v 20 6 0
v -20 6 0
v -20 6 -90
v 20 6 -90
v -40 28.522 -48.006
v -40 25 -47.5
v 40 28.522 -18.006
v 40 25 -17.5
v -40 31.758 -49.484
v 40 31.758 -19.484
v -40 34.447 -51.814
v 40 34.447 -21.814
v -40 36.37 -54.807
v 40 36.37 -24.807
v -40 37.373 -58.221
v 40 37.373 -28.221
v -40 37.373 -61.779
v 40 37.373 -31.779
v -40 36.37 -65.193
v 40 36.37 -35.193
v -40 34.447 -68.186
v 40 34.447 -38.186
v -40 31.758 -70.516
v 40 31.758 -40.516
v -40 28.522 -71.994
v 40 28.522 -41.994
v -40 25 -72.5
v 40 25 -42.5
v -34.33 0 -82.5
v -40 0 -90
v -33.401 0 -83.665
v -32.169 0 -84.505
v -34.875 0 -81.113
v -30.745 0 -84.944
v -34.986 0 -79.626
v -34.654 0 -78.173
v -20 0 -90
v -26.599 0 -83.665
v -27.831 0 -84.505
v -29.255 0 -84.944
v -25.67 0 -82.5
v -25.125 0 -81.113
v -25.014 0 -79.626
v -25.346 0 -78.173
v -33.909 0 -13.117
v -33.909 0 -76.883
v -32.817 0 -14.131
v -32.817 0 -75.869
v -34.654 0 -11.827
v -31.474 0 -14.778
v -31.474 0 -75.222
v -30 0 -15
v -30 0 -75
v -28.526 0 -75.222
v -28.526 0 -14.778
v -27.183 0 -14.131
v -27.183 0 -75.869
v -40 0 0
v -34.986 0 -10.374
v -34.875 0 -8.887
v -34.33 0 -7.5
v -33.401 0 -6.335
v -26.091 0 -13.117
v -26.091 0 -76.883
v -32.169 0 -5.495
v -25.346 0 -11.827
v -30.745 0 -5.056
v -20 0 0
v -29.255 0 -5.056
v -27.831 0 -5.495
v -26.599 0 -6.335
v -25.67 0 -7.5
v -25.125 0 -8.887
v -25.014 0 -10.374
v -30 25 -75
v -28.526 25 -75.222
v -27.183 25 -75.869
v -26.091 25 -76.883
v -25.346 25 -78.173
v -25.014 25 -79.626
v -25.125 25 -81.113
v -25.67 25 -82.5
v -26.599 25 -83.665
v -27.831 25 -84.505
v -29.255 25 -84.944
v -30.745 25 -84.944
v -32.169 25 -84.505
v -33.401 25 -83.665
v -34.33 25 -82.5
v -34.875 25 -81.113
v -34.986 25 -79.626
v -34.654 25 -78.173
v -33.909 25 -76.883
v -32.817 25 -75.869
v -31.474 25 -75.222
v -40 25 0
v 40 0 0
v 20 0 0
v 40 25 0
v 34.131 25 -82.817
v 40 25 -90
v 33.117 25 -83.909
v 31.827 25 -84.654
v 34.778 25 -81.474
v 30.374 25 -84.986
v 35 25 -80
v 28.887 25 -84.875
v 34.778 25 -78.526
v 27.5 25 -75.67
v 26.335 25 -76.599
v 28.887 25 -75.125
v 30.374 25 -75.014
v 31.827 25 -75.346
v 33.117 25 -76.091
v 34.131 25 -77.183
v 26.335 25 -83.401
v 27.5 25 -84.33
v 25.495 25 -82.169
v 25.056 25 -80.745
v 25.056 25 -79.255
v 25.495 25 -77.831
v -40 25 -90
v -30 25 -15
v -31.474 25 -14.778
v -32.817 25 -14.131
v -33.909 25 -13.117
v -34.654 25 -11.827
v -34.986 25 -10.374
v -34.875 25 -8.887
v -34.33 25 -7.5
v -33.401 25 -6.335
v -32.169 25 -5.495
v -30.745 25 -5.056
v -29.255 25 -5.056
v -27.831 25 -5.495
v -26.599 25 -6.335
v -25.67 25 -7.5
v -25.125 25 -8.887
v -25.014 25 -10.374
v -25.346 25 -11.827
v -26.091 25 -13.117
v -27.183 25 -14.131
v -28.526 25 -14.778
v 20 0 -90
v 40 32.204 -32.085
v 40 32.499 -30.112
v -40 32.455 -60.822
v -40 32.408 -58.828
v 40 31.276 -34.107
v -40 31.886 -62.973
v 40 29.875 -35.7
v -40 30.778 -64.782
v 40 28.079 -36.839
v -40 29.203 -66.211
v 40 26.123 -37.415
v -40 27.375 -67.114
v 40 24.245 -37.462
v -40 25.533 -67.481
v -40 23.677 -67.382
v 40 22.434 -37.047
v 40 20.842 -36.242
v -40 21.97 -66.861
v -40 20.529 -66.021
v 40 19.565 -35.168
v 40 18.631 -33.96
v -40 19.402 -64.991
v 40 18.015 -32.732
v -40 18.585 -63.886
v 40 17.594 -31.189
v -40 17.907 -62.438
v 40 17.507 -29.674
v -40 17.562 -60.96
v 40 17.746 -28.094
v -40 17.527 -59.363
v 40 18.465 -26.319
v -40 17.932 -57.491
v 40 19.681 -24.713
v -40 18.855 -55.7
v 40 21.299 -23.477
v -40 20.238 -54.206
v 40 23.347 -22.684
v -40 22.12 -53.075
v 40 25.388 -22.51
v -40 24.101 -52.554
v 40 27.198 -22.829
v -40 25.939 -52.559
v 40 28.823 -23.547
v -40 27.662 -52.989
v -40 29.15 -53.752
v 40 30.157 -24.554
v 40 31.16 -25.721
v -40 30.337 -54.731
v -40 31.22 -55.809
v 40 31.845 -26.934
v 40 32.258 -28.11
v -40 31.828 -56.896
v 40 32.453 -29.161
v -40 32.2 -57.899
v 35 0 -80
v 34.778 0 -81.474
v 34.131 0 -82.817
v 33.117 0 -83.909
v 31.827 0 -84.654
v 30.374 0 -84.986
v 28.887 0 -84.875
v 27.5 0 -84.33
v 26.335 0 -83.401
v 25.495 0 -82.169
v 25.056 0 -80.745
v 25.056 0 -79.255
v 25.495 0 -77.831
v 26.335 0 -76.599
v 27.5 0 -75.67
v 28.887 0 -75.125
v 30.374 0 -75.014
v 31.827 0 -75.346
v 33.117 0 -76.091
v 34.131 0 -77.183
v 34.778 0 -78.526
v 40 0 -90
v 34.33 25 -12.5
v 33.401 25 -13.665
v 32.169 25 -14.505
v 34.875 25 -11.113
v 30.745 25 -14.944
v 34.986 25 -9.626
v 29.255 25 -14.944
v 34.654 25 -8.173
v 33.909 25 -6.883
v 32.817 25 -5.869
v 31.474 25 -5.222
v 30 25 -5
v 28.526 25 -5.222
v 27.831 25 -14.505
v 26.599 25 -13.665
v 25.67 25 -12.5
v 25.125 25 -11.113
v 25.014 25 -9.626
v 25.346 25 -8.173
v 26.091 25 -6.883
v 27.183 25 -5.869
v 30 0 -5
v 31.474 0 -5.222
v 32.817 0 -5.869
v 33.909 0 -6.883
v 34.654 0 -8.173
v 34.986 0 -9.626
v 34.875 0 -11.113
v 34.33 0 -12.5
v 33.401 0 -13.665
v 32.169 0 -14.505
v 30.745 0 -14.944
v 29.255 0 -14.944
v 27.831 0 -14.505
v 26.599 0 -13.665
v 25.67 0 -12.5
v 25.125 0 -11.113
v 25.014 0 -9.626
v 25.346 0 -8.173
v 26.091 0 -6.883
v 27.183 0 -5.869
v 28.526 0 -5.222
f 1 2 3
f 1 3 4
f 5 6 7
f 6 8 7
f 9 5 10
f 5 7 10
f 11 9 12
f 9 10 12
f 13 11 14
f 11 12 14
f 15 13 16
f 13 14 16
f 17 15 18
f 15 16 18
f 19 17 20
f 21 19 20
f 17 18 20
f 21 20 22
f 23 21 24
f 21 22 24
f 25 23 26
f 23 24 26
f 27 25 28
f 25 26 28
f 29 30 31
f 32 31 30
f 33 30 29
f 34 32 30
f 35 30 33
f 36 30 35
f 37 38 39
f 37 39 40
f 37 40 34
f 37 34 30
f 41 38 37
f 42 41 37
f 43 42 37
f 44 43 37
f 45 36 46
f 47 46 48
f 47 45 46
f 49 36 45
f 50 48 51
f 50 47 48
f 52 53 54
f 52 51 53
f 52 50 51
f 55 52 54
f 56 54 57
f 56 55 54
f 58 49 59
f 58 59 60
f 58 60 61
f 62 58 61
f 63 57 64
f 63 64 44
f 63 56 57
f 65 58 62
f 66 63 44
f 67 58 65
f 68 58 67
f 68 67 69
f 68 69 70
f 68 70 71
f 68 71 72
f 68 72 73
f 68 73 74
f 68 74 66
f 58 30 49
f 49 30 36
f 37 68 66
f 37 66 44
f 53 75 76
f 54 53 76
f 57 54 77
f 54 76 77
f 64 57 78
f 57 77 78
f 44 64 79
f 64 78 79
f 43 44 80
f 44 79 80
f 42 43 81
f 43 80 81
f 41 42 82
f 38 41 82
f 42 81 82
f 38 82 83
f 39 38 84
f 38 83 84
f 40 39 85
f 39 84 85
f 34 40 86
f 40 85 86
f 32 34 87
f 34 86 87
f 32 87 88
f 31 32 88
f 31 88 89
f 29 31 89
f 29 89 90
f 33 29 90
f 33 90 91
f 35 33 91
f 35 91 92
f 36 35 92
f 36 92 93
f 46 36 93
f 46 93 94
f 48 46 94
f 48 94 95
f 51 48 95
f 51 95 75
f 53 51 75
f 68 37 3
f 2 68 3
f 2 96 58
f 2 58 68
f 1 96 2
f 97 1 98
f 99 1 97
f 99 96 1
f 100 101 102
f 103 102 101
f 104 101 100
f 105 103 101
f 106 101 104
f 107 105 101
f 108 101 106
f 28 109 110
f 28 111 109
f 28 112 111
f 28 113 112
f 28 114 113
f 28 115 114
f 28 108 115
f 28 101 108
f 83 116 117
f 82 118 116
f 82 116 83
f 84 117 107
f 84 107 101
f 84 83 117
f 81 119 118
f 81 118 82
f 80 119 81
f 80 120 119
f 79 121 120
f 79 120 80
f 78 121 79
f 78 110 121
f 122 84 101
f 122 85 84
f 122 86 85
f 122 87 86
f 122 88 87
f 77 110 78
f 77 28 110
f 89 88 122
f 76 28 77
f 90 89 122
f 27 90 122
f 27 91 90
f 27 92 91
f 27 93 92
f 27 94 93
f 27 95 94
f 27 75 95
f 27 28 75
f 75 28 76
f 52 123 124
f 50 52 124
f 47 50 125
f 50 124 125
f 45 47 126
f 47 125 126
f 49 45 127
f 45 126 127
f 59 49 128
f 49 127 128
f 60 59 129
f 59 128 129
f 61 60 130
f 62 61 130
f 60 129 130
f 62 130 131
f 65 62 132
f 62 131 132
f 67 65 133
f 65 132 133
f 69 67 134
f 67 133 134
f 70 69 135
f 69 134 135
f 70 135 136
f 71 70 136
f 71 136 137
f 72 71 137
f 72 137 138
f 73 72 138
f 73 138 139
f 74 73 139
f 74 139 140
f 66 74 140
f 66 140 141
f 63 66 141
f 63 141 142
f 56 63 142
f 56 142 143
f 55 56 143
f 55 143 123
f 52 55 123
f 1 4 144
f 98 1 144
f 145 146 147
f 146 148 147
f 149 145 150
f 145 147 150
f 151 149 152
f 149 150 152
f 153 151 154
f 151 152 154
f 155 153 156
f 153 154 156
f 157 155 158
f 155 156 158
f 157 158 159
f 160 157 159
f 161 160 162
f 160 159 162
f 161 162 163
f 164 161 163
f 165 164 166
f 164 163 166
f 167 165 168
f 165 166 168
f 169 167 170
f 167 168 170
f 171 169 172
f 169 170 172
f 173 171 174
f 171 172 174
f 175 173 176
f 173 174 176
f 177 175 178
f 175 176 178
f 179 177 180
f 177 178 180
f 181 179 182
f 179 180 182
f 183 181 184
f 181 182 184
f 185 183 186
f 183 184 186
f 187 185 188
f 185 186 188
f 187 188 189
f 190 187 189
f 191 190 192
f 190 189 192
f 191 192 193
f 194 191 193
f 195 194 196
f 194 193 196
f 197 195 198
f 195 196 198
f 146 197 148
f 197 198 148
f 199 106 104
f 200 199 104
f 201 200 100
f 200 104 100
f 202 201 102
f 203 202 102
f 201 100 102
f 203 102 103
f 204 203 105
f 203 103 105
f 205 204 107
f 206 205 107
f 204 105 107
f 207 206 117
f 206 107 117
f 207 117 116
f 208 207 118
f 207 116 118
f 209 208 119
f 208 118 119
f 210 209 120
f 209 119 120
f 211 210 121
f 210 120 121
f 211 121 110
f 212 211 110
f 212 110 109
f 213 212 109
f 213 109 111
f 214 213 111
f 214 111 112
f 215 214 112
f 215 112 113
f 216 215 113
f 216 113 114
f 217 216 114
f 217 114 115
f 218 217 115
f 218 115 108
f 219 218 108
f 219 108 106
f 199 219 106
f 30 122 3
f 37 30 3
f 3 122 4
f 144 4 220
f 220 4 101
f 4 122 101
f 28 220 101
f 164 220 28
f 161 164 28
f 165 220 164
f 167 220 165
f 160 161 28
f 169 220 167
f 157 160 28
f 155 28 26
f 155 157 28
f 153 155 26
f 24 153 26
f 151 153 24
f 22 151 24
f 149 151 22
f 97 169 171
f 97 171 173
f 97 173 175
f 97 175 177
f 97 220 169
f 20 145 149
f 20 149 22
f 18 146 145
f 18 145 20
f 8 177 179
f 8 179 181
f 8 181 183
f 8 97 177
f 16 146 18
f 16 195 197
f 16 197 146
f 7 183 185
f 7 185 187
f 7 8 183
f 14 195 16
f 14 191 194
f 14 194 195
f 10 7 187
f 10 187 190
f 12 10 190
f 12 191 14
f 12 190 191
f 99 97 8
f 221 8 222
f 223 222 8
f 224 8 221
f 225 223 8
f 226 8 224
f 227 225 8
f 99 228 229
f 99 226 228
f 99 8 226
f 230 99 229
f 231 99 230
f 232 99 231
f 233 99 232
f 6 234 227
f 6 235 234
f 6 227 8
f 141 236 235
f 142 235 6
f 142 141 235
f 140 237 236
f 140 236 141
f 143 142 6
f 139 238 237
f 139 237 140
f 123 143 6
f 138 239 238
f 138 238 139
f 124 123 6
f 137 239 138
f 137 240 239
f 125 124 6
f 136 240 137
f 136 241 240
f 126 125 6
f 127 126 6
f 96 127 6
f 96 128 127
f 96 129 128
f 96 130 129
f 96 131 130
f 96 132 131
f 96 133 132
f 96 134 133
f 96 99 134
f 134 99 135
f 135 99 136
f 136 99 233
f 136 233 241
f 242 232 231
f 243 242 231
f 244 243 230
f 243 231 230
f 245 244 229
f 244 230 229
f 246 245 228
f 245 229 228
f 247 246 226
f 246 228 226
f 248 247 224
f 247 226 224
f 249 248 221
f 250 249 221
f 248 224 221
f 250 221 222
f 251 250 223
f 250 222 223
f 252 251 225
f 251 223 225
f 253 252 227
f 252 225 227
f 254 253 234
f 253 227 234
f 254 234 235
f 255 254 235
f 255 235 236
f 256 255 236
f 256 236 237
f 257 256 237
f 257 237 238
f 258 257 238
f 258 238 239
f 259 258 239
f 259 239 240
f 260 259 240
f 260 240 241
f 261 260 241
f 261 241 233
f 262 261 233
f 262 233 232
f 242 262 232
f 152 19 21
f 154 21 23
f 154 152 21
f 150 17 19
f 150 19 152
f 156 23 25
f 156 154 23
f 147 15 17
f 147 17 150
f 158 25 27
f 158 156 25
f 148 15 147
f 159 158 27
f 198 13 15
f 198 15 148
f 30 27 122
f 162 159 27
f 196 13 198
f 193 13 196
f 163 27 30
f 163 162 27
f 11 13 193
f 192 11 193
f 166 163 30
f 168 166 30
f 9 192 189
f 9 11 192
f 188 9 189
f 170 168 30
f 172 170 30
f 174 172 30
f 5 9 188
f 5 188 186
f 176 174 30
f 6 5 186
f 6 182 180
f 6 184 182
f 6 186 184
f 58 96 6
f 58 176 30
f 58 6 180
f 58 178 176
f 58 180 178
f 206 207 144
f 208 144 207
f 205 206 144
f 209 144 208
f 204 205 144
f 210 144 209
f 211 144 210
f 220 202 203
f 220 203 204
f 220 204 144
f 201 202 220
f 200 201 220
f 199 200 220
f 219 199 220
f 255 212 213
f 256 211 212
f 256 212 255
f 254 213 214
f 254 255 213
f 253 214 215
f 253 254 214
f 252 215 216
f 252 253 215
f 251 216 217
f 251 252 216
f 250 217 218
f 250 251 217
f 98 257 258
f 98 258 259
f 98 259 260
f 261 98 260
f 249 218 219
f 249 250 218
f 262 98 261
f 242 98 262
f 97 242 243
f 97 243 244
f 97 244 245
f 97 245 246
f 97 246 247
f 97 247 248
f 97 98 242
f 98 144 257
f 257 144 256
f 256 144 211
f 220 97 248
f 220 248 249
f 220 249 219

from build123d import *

# Parameters (mm, degrees)
SALIENTE_EXTRUIR1_DEPTH = 90
CORTAR_EXTRUIR1_REACH   = 103.612
CROQUIS13_R             = 5


with BuildPart() as part:
    # Croquis1 → Saliente-Extruir1 (new body)
    with BuildSketch(Plane.XY):
        Polygon((-20, 0), (-20, 6), (20, 6), (20, 0), (40, 0), (40, 25), (-40, 25), (-40, 0), align=None)
    extrude(amount=-SALIENTE_EXTRUIR1_DEPTH)

    # Croquis7 → Recubrir5 section 0
    with BuildSketch(Plane.ZY.offset(40)):
        with BuildLine():
            Line((-72.5, 25), (-47.5, 25))
            ThreePointArc((-47.5, 25), (-60, 37.5), (-72.5, 25))
        make_face()
    # Croquis4 → Recubrir5 section 1
    with BuildSketch(Plane(origin=(40, 0, 0), x_dir=(0, 0, -1), z_dir=(1, 0, 0))):
        with BuildLine():
            Line((17.5, 25), (42.5, 25))
            ThreePointArc((42.5, 25), (30, 37.5), (17.5, 25))
        make_face()
    loft()

    # Cortar-Recubrir9: read off the stored shape, not the designer's step
    # Cortar-Recubrir9: loft between two sections, ruled curve by curve
    cortar_recubrir9_from = [
        Edge.make_bspline([(40, 32.499166066, -30.111840594), (40, 32.489846016, -30.7367711), (40, 32.403311627, -31.442559169), (40, 32.050170272, -32.589420619), (40, 31.894761884, -32.985674675), (40, 31.488867377, -33.787689912), (40, 31.23815997, -34.193490215), (40, 30.626297022, -34.984454015), (40, 30.264857287, -35.369499204), (40, 29.428532809, -36.077692088), (40, 28.953437789, -36.400496106), (40, 27.907235106, -36.938588098), (40, 27.33619148, -37.153384345), (40, 26.13890697, -37.438520628), (40, 25.513089911, -37.508486115), (40, 24.2632289, -37.489846016), (40, 23.639776598, -37.401249254), (40, 22.451527572, -37.08053575), (40, 21.887143317, -36.84880603), (40, 20.857452279, -36.279754704), (40, 20.392194841, -35.942926515), (40, 19.577361218, -35.210108693), (40, 19.227564602, -34.814456311), (40, 18.63956098, -34.005598017), (40, 18.40106638, -33.592501883), (40, 18.019269161, -32.778739219), (40, 17.875746519, -32.378026983), (40, 17.556962594, -31.221144617), (40, 17.491513885, -30.513089911), (40, 17.510153984, -29.2632289), (40, 17.596688373, -28.557440831), (40, 17.949829728, -27.410579381), (40, 18.105238116, -27.014325325), (40, 18.511132623, -26.212310088), (40, 18.76184003, -25.806509785), (40, 19.373702978, -25.015545985), (40, 19.735142713, -24.630500796), (40, 20.571467191, -23.922307912), (40, 21.046562211, -23.599503894), (40, 22.092764894, -23.061411902), (40, 22.66380852, -22.846615655), (40, 23.86109303, -22.561479372), (40, 24.486910089, -22.491513885), (40, 25.7367711, -22.510153984), (40, 26.360223402, -22.598750746), (40, 27.548472428, -22.91946425), (40, 28.112856683, -23.15119397), (40, 29.142547721, -23.720245296), (40, 29.607805159, -24.057073485), (40, 30.422638782, -24.789891307), (40, 30.772435398, -25.185543689), (40, 31.36043902, -25.994401983), (40, 31.59893362, -26.407498117), (40, 31.980730839, -27.221260781), (40, 32.124253481, -27.621973017), (40, 32.443037406, -28.778855383), (40, 32.508486115, -29.486910089), (40, 32.499166066, -30.111840594)], [0, 0, 0, 0, 0.0625, 0.0625, 0.09375, 0.09375, 0.125, 0.125, 0.15625, 0.15625, 0.1875, 0.1875, 0.21875, 0.21875, 0.25, 0.25, 0.28125, 0.28125, 0.3125, 0.3125, 0.34375, 0.34375, 0.375, 0.375, 0.40625, 0.40625, 0.4375, 0.4375, 0.5, 0.5, 0.5625, 0.5625, 0.59375, 0.59375, 0.625, 0.625, 0.65625, 0.65625, 0.6875, 0.6875, 0.71875, 0.71875, 0.75, 0.75, 0.78125, 0.78125, 0.8125, 0.8125, 0.84375, 0.84375, 0.875, 0.875, 0.90625, 0.90625, 0.9375, 0.9375, 1, 1, 1, 1], 3),
    ]
    cortar_recubrir9_to = [
        Edge.make_bspline([(-40, 32.407786034, -58.827521395), (-40, 32.505492584, -59.444836898), (-40, 32.540952669, -60.155025311), (-40, 32.389176568, -61.345388288), (-40, 32.303834333, -61.762384388), (-40, 32.041099336, -62.622005881), (-40, 31.863495239, -63.064707671), (-40, 31.395936741, -63.948669802), (-40, 31.105682099, -64.38986219), (-40, 30.4028125, -65.230665449), (-40, 29.989931581, -65.629973674), (-40, 29.051182223, -66.33908064), (-40, 28.525292772, -66.648383946), (-40, 27.394421955, -67.134104129), (-40, 26.789794107, -67.310079483), (-40, 25.555163102, -67.505492584), (-40, 24.925744385, -67.524837827), (-40, 23.700150248, -67.41209072), (-40, 23.104447414, -67.280309139), (-40, 21.992598562, -66.895763725), (-40, 21.476585556, -66.643477599), (-40, 20.548417009, -66.060829384), (-40, 20.136101969, -65.730837282), (-40, 19.418414702, -65.034471726), (-40, 19.112777895, -64.668255626), (-40, 18.597419473, -63.931788052), (-40, 18.38747326, -63.561529181), (-40, 17.875511732, -62.476220288), (-40, 17.689920517, -61.789794107), (-40, 17.494507416, -60.555163102), (-40, 17.459047331, -59.844974689), (-40, 17.610823432, -58.654611712), (-40, 17.696165667, -58.237615612), (-40, 17.958900664, -57.377994119), (-40, 18.136504761, -56.935292329), (-40, 18.604063259, -56.051330198), (-40, 18.894317901, -55.61013781), (-40, 19.5971875, -54.769334551), (-40, 20.010068419, -54.370026326), (-40, 20.948817777, -53.66091936), (-40, 21.474707228, -53.351616054), (-40, 22.605578045, -52.865895871), (-40, 23.210205893, -52.689920517), (-40, 24.444836898, -52.494507416), (-40, 25.074255615, -52.475162173), (-40, 26.299849752, -52.58790928), (-40, 26.895552586, -52.719690861), (-40, 28.007401438, -53.104236275), (-40, 28.523414444, -53.356522401), (-40, 29.451582991, -53.939170616), (-40, 29.863898031, -54.269162718), (-40, 30.581585298, -54.965528274), (-40, 30.887222105, -55.331744374), (-40, 31.402580527, -56.068211948), (-40, 31.61252674, -56.438470819), (-40, 32.124488268, -57.523779712), (-40, 32.310079483, -58.210205893), (-40, 32.407786034, -58.827521395)], [0, 0, 0, 0, 0.0625, 0.0625, 0.09375, 0.09375, 0.125, 0.125, 0.15625, 0.15625, 0.1875, 0.1875, 0.21875, 0.21875, 0.25, 0.25, 0.28125, 0.28125, 0.3125, 0.3125, 0.34375, 0.34375, 0.375, 0.375, 0.40625, 0.40625, 0.4375, 0.4375, 0.5, 0.5, 0.5625, 0.5625, 0.59375, 0.59375, 0.625, 0.625, 0.65625, 0.65625, 0.6875, 0.6875, 0.71875, 0.71875, 0.75, 0.75, 0.78125, 0.78125, 0.8125, 0.8125, 0.84375, 0.84375, 0.875, 0.875, 0.90625, 0.90625, 0.9375, 0.9375, 1, 1, 1, 1], 3),
    ]
    cortar_recubrir9 = Solid(Shell([*[Face.make_surface_from_curves(cortar_recubrir9_from[k], cortar_recubrir9_to[k]) for k in range(1)], Face(Wire(cortar_recubrir9_from)), Face(Wire(cortar_recubrir9_to))]))
    add(cortar_recubrir9, mode=Mode.SUBTRACT)

    # Croquis13 → Cortar-Extruir1 (cut, up to next)
    with BuildSketch(Plane(origin=(0, 25, 0), x_dir=(1, 0, 0), z_dir=(0, 1, 0)), mode=Mode.PRIVATE) as cortar_extruir1_sk1:
        with Locations(Location((-30, 80, 0), (0, 0, 270))):
            Circle(CROQUIS13_R)
    cortar_extruir1_tool1 = extrude(cortar_extruir1_sk1.sketch, amount=-CORTAR_EXTRUIR1_REACH, mode=Mode.PRIVATE) & part.part
    # Croquis13 → Cortar-Extruir1 (cut, up to next)
    with BuildSketch(Plane(origin=(0, 25, 0), x_dir=(1, 0, 0), z_dir=(0, 1, 0)), mode=Mode.PRIVATE) as cortar_extruir1_sk2:
        with Locations((30, 80)):
            Circle(CROQUIS13_R)
    cortar_extruir1_tool2 = extrude(cortar_extruir1_sk2.sketch, amount=-CORTAR_EXTRUIR1_REACH, mode=Mode.PRIVATE) & part.part
    # Croquis13 → Cortar-Extruir1 (cut, up to next)
    with BuildSketch(Plane(origin=(0, 25, 0), x_dir=(1, 0, 0), z_dir=(0, 1, 0)), mode=Mode.PRIVATE) as cortar_extruir1_sk3:
        with Locations(Location((30, 10, 0), (0, 0, 270))):
            Circle(CROQUIS13_R)
    cortar_extruir1_tool3 = extrude(cortar_extruir1_sk3.sketch, amount=-CORTAR_EXTRUIR1_REACH, mode=Mode.PRIVATE) & part.part
    # Croquis13 → Cortar-Extruir1 (cut, up to next)
    with BuildSketch(Plane(origin=(0, 25, 0), x_dir=(1, 0, 0), z_dir=(0, 1, 0)), mode=Mode.PRIVATE) as cortar_extruir1_sk4:
        with Locations(Location((-30, 10, 0), (0, 0, 90))):
            Circle(CROQUIS13_R)
    cortar_extruir1_tool4 = extrude(cortar_extruir1_sk4.sketch, amount=-CORTAR_EXTRUIR1_REACH, mode=Mode.PRIVATE) & part.part
    add(cortar_extruir1_tool1.solids().sort_by_distance((-30, 25, -80))[0], mode=Mode.SUBTRACT)
    add(cortar_extruir1_tool2.solids().sort_by_distance((30, 25, -80))[0], mode=Mode.SUBTRACT)
    add(cortar_extruir1_tool3.solids().sort_by_distance((30, 25, -10))[0], mode=Mode.SUBTRACT)
    add(cortar_extruir1_tool4.solids().sort_by_distance((-30, 25, -10))[0], mode=Mode.SUBTRACT)


solid = part.part
